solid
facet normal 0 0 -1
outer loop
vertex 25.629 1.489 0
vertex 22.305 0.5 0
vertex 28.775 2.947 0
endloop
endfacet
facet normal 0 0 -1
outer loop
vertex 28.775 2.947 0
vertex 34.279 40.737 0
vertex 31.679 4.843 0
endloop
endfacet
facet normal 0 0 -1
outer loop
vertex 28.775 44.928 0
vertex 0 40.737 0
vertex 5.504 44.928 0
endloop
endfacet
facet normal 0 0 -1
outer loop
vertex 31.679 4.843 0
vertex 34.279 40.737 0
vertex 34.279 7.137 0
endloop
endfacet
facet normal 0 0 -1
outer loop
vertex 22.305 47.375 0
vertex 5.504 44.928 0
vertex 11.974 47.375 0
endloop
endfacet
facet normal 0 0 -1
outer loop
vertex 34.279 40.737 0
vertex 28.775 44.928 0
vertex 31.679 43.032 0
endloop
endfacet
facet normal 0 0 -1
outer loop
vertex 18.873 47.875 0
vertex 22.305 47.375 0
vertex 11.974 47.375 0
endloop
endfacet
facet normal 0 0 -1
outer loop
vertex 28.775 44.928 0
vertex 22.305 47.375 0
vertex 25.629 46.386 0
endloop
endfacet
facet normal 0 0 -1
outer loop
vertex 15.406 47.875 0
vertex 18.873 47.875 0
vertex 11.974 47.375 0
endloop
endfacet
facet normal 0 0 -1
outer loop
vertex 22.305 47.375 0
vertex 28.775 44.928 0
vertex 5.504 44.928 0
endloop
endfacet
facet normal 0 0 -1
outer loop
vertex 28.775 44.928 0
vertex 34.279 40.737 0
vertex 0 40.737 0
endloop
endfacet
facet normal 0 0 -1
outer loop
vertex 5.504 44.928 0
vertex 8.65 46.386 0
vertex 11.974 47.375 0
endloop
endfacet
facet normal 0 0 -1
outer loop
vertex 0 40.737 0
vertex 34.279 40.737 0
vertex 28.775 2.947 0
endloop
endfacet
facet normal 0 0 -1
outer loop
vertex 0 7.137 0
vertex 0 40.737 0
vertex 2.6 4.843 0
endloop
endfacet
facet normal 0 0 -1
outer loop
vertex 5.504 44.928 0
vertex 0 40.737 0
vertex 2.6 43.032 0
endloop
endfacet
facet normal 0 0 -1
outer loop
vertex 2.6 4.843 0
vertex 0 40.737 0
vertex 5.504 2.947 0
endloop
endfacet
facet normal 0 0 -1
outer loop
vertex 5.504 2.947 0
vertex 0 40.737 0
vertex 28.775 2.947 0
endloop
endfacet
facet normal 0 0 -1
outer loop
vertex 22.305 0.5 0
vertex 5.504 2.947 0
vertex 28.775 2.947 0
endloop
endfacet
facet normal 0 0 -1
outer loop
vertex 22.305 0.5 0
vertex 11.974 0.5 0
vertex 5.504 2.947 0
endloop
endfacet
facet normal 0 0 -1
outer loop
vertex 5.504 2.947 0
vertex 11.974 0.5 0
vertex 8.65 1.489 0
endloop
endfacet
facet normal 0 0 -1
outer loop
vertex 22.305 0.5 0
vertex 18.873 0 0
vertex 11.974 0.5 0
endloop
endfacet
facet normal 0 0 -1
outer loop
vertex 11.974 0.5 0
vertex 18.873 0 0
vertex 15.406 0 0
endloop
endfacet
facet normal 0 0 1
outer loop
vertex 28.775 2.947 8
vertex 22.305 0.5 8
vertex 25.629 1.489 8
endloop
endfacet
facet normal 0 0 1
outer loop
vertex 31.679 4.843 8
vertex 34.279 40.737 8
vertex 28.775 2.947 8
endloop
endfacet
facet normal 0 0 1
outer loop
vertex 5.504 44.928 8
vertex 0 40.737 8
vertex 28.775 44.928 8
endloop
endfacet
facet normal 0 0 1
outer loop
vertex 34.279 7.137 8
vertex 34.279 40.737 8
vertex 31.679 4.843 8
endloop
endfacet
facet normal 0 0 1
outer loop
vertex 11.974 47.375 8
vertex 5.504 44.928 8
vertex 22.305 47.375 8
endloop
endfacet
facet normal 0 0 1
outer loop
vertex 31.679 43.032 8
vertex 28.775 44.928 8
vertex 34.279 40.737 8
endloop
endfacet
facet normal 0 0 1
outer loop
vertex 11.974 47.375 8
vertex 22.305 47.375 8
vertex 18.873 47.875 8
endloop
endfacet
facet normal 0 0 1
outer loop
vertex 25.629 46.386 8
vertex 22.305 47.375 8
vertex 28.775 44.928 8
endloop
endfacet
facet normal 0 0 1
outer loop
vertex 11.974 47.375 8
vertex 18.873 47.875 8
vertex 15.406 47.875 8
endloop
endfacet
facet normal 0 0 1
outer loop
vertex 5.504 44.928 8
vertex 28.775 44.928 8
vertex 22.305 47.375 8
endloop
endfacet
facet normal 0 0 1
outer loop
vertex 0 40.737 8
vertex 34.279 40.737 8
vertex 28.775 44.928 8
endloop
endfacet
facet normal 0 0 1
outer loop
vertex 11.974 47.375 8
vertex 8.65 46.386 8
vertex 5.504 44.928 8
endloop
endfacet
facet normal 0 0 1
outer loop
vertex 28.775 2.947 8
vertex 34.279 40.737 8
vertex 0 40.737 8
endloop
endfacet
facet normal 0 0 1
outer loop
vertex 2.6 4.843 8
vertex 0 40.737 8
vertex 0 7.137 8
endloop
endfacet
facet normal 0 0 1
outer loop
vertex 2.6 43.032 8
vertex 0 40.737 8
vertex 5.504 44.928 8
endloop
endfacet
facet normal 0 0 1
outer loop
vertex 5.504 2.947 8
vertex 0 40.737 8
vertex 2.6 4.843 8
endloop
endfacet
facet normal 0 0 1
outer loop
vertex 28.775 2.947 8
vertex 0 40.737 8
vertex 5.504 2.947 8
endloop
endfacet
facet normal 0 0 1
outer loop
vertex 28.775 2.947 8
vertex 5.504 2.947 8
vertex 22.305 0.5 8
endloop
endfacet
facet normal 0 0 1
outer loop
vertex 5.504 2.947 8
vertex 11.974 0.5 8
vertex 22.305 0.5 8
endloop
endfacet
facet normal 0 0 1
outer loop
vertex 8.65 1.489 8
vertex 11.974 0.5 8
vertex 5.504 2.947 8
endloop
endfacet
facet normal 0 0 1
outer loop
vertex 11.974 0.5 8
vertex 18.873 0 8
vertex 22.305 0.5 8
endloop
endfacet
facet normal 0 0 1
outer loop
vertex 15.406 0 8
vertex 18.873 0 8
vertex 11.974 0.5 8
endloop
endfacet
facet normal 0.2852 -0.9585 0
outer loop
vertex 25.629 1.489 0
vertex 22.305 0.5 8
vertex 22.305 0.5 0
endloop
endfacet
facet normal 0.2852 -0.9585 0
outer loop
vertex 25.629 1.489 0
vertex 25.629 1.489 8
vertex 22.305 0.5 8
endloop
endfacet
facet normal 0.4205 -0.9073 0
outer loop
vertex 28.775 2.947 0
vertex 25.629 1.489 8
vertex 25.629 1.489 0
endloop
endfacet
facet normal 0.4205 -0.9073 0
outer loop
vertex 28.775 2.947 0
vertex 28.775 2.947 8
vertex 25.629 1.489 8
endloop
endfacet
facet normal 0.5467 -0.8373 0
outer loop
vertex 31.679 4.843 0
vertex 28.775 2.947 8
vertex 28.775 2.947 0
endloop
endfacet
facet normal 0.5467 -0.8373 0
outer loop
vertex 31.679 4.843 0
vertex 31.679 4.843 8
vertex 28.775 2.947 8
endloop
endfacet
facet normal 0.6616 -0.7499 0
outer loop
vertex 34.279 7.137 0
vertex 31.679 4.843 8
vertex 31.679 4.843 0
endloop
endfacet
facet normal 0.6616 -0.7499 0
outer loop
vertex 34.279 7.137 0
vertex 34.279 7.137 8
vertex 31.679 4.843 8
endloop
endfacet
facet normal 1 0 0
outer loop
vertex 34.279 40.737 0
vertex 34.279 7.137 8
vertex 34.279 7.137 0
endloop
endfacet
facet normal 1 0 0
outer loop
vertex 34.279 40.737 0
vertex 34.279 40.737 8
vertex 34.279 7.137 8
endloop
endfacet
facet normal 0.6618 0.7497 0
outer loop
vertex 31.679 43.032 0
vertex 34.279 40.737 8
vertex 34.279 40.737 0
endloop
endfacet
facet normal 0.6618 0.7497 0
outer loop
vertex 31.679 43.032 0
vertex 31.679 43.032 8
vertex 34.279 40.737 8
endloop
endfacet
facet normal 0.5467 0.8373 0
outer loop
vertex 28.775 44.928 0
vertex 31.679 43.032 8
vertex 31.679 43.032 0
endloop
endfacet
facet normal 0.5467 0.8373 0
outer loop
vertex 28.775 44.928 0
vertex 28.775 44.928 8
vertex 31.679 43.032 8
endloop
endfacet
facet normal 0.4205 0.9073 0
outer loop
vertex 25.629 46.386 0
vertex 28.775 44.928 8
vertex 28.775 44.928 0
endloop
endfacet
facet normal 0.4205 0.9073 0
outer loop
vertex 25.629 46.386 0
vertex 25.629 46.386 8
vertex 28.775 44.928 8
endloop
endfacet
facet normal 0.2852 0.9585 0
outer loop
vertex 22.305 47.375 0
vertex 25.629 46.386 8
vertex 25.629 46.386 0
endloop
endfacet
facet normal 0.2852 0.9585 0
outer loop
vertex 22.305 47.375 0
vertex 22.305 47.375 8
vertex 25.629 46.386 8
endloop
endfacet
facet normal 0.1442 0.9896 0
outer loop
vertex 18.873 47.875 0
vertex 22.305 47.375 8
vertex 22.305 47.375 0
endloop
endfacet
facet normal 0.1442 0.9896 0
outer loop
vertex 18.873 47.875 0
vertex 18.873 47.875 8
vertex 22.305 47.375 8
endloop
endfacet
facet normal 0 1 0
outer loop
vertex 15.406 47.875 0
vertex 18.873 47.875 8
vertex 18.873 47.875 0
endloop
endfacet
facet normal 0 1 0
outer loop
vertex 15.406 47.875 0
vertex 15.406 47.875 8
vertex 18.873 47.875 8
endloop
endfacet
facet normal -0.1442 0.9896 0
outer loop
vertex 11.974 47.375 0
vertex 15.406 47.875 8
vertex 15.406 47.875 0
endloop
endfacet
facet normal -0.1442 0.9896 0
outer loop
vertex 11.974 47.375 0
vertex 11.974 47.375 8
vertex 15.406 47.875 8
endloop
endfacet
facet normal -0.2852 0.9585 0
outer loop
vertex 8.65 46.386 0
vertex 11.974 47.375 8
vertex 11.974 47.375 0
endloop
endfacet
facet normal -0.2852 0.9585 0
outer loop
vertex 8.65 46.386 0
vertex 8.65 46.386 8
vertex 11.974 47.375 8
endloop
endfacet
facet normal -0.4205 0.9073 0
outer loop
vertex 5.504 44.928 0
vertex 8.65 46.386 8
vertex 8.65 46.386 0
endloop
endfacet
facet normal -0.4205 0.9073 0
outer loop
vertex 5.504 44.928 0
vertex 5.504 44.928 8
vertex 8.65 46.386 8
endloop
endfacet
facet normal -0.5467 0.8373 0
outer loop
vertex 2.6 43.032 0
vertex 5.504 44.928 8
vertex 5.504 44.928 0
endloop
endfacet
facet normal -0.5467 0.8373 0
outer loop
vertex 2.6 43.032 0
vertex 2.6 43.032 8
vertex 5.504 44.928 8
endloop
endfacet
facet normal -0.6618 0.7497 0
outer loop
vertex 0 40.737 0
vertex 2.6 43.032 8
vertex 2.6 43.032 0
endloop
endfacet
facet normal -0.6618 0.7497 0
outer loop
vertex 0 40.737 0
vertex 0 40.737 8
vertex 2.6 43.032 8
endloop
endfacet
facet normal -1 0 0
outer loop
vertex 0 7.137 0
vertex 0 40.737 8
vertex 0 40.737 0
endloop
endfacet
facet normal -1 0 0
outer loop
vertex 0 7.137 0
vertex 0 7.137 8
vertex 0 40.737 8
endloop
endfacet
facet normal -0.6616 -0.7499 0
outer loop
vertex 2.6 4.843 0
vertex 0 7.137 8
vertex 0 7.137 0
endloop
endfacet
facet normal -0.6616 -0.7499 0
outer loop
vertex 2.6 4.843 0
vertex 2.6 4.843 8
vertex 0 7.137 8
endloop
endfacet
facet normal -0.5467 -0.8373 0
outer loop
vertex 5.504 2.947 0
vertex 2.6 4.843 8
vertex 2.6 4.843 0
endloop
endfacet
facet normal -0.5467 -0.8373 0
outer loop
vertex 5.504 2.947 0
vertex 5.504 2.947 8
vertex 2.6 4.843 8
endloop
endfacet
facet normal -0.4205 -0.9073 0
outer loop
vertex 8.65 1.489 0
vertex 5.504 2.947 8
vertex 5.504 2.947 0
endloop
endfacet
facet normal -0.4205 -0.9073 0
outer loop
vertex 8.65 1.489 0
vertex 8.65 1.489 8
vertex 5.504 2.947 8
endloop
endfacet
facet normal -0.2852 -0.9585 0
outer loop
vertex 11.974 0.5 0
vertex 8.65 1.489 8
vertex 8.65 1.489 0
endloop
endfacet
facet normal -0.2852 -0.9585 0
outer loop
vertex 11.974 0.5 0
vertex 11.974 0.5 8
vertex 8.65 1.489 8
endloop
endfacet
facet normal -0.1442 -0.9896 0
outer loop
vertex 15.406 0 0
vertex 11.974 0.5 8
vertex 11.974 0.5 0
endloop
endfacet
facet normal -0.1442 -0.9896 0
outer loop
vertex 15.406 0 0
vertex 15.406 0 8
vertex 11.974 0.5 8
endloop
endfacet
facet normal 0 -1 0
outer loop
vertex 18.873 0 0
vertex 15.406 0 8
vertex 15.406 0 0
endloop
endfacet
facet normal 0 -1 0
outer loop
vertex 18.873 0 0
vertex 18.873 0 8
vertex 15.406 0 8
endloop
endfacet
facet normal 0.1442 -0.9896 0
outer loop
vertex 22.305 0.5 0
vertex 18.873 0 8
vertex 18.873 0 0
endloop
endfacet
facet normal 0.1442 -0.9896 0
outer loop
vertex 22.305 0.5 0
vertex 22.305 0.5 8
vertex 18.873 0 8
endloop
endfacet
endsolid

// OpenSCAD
$fn = 32;

// ----------------------------------------------------------------------
// Eccentric disc: double_d, 8 mm thick
// ----------------------------------------------------------------------

// --- parameters (mm) ---
profile_height = 8;       // extrusion height
profile_points = 24;      // points of the closed outline

profile = [[34.279, 40.737], [31.679, 43.032], [28.775, 44.928], [25.629, 46.386], [22.305, 47.375], [18.873, 47.875], [15.406, 47.875], [11.974, 47.375], [8.65, 46.386], [5.504, 44.928], [2.6, 43.032], [0, 40.737], [0, 7.137], [2.6, 4.843], [5.504, 2.947], [8.65, 1.489], [11.974, 0.5], [15.406, 0], [18.873, 0], [22.305, 0.5], [25.629, 1.489], [28.775, 2.947], [31.679, 4.843], [34.279, 7.137]];  // single closed polygon, 24 points, counter clockwise

// --- the one profile operation ---
linear_extrude(height = profile_height) polygon(points = profile);
